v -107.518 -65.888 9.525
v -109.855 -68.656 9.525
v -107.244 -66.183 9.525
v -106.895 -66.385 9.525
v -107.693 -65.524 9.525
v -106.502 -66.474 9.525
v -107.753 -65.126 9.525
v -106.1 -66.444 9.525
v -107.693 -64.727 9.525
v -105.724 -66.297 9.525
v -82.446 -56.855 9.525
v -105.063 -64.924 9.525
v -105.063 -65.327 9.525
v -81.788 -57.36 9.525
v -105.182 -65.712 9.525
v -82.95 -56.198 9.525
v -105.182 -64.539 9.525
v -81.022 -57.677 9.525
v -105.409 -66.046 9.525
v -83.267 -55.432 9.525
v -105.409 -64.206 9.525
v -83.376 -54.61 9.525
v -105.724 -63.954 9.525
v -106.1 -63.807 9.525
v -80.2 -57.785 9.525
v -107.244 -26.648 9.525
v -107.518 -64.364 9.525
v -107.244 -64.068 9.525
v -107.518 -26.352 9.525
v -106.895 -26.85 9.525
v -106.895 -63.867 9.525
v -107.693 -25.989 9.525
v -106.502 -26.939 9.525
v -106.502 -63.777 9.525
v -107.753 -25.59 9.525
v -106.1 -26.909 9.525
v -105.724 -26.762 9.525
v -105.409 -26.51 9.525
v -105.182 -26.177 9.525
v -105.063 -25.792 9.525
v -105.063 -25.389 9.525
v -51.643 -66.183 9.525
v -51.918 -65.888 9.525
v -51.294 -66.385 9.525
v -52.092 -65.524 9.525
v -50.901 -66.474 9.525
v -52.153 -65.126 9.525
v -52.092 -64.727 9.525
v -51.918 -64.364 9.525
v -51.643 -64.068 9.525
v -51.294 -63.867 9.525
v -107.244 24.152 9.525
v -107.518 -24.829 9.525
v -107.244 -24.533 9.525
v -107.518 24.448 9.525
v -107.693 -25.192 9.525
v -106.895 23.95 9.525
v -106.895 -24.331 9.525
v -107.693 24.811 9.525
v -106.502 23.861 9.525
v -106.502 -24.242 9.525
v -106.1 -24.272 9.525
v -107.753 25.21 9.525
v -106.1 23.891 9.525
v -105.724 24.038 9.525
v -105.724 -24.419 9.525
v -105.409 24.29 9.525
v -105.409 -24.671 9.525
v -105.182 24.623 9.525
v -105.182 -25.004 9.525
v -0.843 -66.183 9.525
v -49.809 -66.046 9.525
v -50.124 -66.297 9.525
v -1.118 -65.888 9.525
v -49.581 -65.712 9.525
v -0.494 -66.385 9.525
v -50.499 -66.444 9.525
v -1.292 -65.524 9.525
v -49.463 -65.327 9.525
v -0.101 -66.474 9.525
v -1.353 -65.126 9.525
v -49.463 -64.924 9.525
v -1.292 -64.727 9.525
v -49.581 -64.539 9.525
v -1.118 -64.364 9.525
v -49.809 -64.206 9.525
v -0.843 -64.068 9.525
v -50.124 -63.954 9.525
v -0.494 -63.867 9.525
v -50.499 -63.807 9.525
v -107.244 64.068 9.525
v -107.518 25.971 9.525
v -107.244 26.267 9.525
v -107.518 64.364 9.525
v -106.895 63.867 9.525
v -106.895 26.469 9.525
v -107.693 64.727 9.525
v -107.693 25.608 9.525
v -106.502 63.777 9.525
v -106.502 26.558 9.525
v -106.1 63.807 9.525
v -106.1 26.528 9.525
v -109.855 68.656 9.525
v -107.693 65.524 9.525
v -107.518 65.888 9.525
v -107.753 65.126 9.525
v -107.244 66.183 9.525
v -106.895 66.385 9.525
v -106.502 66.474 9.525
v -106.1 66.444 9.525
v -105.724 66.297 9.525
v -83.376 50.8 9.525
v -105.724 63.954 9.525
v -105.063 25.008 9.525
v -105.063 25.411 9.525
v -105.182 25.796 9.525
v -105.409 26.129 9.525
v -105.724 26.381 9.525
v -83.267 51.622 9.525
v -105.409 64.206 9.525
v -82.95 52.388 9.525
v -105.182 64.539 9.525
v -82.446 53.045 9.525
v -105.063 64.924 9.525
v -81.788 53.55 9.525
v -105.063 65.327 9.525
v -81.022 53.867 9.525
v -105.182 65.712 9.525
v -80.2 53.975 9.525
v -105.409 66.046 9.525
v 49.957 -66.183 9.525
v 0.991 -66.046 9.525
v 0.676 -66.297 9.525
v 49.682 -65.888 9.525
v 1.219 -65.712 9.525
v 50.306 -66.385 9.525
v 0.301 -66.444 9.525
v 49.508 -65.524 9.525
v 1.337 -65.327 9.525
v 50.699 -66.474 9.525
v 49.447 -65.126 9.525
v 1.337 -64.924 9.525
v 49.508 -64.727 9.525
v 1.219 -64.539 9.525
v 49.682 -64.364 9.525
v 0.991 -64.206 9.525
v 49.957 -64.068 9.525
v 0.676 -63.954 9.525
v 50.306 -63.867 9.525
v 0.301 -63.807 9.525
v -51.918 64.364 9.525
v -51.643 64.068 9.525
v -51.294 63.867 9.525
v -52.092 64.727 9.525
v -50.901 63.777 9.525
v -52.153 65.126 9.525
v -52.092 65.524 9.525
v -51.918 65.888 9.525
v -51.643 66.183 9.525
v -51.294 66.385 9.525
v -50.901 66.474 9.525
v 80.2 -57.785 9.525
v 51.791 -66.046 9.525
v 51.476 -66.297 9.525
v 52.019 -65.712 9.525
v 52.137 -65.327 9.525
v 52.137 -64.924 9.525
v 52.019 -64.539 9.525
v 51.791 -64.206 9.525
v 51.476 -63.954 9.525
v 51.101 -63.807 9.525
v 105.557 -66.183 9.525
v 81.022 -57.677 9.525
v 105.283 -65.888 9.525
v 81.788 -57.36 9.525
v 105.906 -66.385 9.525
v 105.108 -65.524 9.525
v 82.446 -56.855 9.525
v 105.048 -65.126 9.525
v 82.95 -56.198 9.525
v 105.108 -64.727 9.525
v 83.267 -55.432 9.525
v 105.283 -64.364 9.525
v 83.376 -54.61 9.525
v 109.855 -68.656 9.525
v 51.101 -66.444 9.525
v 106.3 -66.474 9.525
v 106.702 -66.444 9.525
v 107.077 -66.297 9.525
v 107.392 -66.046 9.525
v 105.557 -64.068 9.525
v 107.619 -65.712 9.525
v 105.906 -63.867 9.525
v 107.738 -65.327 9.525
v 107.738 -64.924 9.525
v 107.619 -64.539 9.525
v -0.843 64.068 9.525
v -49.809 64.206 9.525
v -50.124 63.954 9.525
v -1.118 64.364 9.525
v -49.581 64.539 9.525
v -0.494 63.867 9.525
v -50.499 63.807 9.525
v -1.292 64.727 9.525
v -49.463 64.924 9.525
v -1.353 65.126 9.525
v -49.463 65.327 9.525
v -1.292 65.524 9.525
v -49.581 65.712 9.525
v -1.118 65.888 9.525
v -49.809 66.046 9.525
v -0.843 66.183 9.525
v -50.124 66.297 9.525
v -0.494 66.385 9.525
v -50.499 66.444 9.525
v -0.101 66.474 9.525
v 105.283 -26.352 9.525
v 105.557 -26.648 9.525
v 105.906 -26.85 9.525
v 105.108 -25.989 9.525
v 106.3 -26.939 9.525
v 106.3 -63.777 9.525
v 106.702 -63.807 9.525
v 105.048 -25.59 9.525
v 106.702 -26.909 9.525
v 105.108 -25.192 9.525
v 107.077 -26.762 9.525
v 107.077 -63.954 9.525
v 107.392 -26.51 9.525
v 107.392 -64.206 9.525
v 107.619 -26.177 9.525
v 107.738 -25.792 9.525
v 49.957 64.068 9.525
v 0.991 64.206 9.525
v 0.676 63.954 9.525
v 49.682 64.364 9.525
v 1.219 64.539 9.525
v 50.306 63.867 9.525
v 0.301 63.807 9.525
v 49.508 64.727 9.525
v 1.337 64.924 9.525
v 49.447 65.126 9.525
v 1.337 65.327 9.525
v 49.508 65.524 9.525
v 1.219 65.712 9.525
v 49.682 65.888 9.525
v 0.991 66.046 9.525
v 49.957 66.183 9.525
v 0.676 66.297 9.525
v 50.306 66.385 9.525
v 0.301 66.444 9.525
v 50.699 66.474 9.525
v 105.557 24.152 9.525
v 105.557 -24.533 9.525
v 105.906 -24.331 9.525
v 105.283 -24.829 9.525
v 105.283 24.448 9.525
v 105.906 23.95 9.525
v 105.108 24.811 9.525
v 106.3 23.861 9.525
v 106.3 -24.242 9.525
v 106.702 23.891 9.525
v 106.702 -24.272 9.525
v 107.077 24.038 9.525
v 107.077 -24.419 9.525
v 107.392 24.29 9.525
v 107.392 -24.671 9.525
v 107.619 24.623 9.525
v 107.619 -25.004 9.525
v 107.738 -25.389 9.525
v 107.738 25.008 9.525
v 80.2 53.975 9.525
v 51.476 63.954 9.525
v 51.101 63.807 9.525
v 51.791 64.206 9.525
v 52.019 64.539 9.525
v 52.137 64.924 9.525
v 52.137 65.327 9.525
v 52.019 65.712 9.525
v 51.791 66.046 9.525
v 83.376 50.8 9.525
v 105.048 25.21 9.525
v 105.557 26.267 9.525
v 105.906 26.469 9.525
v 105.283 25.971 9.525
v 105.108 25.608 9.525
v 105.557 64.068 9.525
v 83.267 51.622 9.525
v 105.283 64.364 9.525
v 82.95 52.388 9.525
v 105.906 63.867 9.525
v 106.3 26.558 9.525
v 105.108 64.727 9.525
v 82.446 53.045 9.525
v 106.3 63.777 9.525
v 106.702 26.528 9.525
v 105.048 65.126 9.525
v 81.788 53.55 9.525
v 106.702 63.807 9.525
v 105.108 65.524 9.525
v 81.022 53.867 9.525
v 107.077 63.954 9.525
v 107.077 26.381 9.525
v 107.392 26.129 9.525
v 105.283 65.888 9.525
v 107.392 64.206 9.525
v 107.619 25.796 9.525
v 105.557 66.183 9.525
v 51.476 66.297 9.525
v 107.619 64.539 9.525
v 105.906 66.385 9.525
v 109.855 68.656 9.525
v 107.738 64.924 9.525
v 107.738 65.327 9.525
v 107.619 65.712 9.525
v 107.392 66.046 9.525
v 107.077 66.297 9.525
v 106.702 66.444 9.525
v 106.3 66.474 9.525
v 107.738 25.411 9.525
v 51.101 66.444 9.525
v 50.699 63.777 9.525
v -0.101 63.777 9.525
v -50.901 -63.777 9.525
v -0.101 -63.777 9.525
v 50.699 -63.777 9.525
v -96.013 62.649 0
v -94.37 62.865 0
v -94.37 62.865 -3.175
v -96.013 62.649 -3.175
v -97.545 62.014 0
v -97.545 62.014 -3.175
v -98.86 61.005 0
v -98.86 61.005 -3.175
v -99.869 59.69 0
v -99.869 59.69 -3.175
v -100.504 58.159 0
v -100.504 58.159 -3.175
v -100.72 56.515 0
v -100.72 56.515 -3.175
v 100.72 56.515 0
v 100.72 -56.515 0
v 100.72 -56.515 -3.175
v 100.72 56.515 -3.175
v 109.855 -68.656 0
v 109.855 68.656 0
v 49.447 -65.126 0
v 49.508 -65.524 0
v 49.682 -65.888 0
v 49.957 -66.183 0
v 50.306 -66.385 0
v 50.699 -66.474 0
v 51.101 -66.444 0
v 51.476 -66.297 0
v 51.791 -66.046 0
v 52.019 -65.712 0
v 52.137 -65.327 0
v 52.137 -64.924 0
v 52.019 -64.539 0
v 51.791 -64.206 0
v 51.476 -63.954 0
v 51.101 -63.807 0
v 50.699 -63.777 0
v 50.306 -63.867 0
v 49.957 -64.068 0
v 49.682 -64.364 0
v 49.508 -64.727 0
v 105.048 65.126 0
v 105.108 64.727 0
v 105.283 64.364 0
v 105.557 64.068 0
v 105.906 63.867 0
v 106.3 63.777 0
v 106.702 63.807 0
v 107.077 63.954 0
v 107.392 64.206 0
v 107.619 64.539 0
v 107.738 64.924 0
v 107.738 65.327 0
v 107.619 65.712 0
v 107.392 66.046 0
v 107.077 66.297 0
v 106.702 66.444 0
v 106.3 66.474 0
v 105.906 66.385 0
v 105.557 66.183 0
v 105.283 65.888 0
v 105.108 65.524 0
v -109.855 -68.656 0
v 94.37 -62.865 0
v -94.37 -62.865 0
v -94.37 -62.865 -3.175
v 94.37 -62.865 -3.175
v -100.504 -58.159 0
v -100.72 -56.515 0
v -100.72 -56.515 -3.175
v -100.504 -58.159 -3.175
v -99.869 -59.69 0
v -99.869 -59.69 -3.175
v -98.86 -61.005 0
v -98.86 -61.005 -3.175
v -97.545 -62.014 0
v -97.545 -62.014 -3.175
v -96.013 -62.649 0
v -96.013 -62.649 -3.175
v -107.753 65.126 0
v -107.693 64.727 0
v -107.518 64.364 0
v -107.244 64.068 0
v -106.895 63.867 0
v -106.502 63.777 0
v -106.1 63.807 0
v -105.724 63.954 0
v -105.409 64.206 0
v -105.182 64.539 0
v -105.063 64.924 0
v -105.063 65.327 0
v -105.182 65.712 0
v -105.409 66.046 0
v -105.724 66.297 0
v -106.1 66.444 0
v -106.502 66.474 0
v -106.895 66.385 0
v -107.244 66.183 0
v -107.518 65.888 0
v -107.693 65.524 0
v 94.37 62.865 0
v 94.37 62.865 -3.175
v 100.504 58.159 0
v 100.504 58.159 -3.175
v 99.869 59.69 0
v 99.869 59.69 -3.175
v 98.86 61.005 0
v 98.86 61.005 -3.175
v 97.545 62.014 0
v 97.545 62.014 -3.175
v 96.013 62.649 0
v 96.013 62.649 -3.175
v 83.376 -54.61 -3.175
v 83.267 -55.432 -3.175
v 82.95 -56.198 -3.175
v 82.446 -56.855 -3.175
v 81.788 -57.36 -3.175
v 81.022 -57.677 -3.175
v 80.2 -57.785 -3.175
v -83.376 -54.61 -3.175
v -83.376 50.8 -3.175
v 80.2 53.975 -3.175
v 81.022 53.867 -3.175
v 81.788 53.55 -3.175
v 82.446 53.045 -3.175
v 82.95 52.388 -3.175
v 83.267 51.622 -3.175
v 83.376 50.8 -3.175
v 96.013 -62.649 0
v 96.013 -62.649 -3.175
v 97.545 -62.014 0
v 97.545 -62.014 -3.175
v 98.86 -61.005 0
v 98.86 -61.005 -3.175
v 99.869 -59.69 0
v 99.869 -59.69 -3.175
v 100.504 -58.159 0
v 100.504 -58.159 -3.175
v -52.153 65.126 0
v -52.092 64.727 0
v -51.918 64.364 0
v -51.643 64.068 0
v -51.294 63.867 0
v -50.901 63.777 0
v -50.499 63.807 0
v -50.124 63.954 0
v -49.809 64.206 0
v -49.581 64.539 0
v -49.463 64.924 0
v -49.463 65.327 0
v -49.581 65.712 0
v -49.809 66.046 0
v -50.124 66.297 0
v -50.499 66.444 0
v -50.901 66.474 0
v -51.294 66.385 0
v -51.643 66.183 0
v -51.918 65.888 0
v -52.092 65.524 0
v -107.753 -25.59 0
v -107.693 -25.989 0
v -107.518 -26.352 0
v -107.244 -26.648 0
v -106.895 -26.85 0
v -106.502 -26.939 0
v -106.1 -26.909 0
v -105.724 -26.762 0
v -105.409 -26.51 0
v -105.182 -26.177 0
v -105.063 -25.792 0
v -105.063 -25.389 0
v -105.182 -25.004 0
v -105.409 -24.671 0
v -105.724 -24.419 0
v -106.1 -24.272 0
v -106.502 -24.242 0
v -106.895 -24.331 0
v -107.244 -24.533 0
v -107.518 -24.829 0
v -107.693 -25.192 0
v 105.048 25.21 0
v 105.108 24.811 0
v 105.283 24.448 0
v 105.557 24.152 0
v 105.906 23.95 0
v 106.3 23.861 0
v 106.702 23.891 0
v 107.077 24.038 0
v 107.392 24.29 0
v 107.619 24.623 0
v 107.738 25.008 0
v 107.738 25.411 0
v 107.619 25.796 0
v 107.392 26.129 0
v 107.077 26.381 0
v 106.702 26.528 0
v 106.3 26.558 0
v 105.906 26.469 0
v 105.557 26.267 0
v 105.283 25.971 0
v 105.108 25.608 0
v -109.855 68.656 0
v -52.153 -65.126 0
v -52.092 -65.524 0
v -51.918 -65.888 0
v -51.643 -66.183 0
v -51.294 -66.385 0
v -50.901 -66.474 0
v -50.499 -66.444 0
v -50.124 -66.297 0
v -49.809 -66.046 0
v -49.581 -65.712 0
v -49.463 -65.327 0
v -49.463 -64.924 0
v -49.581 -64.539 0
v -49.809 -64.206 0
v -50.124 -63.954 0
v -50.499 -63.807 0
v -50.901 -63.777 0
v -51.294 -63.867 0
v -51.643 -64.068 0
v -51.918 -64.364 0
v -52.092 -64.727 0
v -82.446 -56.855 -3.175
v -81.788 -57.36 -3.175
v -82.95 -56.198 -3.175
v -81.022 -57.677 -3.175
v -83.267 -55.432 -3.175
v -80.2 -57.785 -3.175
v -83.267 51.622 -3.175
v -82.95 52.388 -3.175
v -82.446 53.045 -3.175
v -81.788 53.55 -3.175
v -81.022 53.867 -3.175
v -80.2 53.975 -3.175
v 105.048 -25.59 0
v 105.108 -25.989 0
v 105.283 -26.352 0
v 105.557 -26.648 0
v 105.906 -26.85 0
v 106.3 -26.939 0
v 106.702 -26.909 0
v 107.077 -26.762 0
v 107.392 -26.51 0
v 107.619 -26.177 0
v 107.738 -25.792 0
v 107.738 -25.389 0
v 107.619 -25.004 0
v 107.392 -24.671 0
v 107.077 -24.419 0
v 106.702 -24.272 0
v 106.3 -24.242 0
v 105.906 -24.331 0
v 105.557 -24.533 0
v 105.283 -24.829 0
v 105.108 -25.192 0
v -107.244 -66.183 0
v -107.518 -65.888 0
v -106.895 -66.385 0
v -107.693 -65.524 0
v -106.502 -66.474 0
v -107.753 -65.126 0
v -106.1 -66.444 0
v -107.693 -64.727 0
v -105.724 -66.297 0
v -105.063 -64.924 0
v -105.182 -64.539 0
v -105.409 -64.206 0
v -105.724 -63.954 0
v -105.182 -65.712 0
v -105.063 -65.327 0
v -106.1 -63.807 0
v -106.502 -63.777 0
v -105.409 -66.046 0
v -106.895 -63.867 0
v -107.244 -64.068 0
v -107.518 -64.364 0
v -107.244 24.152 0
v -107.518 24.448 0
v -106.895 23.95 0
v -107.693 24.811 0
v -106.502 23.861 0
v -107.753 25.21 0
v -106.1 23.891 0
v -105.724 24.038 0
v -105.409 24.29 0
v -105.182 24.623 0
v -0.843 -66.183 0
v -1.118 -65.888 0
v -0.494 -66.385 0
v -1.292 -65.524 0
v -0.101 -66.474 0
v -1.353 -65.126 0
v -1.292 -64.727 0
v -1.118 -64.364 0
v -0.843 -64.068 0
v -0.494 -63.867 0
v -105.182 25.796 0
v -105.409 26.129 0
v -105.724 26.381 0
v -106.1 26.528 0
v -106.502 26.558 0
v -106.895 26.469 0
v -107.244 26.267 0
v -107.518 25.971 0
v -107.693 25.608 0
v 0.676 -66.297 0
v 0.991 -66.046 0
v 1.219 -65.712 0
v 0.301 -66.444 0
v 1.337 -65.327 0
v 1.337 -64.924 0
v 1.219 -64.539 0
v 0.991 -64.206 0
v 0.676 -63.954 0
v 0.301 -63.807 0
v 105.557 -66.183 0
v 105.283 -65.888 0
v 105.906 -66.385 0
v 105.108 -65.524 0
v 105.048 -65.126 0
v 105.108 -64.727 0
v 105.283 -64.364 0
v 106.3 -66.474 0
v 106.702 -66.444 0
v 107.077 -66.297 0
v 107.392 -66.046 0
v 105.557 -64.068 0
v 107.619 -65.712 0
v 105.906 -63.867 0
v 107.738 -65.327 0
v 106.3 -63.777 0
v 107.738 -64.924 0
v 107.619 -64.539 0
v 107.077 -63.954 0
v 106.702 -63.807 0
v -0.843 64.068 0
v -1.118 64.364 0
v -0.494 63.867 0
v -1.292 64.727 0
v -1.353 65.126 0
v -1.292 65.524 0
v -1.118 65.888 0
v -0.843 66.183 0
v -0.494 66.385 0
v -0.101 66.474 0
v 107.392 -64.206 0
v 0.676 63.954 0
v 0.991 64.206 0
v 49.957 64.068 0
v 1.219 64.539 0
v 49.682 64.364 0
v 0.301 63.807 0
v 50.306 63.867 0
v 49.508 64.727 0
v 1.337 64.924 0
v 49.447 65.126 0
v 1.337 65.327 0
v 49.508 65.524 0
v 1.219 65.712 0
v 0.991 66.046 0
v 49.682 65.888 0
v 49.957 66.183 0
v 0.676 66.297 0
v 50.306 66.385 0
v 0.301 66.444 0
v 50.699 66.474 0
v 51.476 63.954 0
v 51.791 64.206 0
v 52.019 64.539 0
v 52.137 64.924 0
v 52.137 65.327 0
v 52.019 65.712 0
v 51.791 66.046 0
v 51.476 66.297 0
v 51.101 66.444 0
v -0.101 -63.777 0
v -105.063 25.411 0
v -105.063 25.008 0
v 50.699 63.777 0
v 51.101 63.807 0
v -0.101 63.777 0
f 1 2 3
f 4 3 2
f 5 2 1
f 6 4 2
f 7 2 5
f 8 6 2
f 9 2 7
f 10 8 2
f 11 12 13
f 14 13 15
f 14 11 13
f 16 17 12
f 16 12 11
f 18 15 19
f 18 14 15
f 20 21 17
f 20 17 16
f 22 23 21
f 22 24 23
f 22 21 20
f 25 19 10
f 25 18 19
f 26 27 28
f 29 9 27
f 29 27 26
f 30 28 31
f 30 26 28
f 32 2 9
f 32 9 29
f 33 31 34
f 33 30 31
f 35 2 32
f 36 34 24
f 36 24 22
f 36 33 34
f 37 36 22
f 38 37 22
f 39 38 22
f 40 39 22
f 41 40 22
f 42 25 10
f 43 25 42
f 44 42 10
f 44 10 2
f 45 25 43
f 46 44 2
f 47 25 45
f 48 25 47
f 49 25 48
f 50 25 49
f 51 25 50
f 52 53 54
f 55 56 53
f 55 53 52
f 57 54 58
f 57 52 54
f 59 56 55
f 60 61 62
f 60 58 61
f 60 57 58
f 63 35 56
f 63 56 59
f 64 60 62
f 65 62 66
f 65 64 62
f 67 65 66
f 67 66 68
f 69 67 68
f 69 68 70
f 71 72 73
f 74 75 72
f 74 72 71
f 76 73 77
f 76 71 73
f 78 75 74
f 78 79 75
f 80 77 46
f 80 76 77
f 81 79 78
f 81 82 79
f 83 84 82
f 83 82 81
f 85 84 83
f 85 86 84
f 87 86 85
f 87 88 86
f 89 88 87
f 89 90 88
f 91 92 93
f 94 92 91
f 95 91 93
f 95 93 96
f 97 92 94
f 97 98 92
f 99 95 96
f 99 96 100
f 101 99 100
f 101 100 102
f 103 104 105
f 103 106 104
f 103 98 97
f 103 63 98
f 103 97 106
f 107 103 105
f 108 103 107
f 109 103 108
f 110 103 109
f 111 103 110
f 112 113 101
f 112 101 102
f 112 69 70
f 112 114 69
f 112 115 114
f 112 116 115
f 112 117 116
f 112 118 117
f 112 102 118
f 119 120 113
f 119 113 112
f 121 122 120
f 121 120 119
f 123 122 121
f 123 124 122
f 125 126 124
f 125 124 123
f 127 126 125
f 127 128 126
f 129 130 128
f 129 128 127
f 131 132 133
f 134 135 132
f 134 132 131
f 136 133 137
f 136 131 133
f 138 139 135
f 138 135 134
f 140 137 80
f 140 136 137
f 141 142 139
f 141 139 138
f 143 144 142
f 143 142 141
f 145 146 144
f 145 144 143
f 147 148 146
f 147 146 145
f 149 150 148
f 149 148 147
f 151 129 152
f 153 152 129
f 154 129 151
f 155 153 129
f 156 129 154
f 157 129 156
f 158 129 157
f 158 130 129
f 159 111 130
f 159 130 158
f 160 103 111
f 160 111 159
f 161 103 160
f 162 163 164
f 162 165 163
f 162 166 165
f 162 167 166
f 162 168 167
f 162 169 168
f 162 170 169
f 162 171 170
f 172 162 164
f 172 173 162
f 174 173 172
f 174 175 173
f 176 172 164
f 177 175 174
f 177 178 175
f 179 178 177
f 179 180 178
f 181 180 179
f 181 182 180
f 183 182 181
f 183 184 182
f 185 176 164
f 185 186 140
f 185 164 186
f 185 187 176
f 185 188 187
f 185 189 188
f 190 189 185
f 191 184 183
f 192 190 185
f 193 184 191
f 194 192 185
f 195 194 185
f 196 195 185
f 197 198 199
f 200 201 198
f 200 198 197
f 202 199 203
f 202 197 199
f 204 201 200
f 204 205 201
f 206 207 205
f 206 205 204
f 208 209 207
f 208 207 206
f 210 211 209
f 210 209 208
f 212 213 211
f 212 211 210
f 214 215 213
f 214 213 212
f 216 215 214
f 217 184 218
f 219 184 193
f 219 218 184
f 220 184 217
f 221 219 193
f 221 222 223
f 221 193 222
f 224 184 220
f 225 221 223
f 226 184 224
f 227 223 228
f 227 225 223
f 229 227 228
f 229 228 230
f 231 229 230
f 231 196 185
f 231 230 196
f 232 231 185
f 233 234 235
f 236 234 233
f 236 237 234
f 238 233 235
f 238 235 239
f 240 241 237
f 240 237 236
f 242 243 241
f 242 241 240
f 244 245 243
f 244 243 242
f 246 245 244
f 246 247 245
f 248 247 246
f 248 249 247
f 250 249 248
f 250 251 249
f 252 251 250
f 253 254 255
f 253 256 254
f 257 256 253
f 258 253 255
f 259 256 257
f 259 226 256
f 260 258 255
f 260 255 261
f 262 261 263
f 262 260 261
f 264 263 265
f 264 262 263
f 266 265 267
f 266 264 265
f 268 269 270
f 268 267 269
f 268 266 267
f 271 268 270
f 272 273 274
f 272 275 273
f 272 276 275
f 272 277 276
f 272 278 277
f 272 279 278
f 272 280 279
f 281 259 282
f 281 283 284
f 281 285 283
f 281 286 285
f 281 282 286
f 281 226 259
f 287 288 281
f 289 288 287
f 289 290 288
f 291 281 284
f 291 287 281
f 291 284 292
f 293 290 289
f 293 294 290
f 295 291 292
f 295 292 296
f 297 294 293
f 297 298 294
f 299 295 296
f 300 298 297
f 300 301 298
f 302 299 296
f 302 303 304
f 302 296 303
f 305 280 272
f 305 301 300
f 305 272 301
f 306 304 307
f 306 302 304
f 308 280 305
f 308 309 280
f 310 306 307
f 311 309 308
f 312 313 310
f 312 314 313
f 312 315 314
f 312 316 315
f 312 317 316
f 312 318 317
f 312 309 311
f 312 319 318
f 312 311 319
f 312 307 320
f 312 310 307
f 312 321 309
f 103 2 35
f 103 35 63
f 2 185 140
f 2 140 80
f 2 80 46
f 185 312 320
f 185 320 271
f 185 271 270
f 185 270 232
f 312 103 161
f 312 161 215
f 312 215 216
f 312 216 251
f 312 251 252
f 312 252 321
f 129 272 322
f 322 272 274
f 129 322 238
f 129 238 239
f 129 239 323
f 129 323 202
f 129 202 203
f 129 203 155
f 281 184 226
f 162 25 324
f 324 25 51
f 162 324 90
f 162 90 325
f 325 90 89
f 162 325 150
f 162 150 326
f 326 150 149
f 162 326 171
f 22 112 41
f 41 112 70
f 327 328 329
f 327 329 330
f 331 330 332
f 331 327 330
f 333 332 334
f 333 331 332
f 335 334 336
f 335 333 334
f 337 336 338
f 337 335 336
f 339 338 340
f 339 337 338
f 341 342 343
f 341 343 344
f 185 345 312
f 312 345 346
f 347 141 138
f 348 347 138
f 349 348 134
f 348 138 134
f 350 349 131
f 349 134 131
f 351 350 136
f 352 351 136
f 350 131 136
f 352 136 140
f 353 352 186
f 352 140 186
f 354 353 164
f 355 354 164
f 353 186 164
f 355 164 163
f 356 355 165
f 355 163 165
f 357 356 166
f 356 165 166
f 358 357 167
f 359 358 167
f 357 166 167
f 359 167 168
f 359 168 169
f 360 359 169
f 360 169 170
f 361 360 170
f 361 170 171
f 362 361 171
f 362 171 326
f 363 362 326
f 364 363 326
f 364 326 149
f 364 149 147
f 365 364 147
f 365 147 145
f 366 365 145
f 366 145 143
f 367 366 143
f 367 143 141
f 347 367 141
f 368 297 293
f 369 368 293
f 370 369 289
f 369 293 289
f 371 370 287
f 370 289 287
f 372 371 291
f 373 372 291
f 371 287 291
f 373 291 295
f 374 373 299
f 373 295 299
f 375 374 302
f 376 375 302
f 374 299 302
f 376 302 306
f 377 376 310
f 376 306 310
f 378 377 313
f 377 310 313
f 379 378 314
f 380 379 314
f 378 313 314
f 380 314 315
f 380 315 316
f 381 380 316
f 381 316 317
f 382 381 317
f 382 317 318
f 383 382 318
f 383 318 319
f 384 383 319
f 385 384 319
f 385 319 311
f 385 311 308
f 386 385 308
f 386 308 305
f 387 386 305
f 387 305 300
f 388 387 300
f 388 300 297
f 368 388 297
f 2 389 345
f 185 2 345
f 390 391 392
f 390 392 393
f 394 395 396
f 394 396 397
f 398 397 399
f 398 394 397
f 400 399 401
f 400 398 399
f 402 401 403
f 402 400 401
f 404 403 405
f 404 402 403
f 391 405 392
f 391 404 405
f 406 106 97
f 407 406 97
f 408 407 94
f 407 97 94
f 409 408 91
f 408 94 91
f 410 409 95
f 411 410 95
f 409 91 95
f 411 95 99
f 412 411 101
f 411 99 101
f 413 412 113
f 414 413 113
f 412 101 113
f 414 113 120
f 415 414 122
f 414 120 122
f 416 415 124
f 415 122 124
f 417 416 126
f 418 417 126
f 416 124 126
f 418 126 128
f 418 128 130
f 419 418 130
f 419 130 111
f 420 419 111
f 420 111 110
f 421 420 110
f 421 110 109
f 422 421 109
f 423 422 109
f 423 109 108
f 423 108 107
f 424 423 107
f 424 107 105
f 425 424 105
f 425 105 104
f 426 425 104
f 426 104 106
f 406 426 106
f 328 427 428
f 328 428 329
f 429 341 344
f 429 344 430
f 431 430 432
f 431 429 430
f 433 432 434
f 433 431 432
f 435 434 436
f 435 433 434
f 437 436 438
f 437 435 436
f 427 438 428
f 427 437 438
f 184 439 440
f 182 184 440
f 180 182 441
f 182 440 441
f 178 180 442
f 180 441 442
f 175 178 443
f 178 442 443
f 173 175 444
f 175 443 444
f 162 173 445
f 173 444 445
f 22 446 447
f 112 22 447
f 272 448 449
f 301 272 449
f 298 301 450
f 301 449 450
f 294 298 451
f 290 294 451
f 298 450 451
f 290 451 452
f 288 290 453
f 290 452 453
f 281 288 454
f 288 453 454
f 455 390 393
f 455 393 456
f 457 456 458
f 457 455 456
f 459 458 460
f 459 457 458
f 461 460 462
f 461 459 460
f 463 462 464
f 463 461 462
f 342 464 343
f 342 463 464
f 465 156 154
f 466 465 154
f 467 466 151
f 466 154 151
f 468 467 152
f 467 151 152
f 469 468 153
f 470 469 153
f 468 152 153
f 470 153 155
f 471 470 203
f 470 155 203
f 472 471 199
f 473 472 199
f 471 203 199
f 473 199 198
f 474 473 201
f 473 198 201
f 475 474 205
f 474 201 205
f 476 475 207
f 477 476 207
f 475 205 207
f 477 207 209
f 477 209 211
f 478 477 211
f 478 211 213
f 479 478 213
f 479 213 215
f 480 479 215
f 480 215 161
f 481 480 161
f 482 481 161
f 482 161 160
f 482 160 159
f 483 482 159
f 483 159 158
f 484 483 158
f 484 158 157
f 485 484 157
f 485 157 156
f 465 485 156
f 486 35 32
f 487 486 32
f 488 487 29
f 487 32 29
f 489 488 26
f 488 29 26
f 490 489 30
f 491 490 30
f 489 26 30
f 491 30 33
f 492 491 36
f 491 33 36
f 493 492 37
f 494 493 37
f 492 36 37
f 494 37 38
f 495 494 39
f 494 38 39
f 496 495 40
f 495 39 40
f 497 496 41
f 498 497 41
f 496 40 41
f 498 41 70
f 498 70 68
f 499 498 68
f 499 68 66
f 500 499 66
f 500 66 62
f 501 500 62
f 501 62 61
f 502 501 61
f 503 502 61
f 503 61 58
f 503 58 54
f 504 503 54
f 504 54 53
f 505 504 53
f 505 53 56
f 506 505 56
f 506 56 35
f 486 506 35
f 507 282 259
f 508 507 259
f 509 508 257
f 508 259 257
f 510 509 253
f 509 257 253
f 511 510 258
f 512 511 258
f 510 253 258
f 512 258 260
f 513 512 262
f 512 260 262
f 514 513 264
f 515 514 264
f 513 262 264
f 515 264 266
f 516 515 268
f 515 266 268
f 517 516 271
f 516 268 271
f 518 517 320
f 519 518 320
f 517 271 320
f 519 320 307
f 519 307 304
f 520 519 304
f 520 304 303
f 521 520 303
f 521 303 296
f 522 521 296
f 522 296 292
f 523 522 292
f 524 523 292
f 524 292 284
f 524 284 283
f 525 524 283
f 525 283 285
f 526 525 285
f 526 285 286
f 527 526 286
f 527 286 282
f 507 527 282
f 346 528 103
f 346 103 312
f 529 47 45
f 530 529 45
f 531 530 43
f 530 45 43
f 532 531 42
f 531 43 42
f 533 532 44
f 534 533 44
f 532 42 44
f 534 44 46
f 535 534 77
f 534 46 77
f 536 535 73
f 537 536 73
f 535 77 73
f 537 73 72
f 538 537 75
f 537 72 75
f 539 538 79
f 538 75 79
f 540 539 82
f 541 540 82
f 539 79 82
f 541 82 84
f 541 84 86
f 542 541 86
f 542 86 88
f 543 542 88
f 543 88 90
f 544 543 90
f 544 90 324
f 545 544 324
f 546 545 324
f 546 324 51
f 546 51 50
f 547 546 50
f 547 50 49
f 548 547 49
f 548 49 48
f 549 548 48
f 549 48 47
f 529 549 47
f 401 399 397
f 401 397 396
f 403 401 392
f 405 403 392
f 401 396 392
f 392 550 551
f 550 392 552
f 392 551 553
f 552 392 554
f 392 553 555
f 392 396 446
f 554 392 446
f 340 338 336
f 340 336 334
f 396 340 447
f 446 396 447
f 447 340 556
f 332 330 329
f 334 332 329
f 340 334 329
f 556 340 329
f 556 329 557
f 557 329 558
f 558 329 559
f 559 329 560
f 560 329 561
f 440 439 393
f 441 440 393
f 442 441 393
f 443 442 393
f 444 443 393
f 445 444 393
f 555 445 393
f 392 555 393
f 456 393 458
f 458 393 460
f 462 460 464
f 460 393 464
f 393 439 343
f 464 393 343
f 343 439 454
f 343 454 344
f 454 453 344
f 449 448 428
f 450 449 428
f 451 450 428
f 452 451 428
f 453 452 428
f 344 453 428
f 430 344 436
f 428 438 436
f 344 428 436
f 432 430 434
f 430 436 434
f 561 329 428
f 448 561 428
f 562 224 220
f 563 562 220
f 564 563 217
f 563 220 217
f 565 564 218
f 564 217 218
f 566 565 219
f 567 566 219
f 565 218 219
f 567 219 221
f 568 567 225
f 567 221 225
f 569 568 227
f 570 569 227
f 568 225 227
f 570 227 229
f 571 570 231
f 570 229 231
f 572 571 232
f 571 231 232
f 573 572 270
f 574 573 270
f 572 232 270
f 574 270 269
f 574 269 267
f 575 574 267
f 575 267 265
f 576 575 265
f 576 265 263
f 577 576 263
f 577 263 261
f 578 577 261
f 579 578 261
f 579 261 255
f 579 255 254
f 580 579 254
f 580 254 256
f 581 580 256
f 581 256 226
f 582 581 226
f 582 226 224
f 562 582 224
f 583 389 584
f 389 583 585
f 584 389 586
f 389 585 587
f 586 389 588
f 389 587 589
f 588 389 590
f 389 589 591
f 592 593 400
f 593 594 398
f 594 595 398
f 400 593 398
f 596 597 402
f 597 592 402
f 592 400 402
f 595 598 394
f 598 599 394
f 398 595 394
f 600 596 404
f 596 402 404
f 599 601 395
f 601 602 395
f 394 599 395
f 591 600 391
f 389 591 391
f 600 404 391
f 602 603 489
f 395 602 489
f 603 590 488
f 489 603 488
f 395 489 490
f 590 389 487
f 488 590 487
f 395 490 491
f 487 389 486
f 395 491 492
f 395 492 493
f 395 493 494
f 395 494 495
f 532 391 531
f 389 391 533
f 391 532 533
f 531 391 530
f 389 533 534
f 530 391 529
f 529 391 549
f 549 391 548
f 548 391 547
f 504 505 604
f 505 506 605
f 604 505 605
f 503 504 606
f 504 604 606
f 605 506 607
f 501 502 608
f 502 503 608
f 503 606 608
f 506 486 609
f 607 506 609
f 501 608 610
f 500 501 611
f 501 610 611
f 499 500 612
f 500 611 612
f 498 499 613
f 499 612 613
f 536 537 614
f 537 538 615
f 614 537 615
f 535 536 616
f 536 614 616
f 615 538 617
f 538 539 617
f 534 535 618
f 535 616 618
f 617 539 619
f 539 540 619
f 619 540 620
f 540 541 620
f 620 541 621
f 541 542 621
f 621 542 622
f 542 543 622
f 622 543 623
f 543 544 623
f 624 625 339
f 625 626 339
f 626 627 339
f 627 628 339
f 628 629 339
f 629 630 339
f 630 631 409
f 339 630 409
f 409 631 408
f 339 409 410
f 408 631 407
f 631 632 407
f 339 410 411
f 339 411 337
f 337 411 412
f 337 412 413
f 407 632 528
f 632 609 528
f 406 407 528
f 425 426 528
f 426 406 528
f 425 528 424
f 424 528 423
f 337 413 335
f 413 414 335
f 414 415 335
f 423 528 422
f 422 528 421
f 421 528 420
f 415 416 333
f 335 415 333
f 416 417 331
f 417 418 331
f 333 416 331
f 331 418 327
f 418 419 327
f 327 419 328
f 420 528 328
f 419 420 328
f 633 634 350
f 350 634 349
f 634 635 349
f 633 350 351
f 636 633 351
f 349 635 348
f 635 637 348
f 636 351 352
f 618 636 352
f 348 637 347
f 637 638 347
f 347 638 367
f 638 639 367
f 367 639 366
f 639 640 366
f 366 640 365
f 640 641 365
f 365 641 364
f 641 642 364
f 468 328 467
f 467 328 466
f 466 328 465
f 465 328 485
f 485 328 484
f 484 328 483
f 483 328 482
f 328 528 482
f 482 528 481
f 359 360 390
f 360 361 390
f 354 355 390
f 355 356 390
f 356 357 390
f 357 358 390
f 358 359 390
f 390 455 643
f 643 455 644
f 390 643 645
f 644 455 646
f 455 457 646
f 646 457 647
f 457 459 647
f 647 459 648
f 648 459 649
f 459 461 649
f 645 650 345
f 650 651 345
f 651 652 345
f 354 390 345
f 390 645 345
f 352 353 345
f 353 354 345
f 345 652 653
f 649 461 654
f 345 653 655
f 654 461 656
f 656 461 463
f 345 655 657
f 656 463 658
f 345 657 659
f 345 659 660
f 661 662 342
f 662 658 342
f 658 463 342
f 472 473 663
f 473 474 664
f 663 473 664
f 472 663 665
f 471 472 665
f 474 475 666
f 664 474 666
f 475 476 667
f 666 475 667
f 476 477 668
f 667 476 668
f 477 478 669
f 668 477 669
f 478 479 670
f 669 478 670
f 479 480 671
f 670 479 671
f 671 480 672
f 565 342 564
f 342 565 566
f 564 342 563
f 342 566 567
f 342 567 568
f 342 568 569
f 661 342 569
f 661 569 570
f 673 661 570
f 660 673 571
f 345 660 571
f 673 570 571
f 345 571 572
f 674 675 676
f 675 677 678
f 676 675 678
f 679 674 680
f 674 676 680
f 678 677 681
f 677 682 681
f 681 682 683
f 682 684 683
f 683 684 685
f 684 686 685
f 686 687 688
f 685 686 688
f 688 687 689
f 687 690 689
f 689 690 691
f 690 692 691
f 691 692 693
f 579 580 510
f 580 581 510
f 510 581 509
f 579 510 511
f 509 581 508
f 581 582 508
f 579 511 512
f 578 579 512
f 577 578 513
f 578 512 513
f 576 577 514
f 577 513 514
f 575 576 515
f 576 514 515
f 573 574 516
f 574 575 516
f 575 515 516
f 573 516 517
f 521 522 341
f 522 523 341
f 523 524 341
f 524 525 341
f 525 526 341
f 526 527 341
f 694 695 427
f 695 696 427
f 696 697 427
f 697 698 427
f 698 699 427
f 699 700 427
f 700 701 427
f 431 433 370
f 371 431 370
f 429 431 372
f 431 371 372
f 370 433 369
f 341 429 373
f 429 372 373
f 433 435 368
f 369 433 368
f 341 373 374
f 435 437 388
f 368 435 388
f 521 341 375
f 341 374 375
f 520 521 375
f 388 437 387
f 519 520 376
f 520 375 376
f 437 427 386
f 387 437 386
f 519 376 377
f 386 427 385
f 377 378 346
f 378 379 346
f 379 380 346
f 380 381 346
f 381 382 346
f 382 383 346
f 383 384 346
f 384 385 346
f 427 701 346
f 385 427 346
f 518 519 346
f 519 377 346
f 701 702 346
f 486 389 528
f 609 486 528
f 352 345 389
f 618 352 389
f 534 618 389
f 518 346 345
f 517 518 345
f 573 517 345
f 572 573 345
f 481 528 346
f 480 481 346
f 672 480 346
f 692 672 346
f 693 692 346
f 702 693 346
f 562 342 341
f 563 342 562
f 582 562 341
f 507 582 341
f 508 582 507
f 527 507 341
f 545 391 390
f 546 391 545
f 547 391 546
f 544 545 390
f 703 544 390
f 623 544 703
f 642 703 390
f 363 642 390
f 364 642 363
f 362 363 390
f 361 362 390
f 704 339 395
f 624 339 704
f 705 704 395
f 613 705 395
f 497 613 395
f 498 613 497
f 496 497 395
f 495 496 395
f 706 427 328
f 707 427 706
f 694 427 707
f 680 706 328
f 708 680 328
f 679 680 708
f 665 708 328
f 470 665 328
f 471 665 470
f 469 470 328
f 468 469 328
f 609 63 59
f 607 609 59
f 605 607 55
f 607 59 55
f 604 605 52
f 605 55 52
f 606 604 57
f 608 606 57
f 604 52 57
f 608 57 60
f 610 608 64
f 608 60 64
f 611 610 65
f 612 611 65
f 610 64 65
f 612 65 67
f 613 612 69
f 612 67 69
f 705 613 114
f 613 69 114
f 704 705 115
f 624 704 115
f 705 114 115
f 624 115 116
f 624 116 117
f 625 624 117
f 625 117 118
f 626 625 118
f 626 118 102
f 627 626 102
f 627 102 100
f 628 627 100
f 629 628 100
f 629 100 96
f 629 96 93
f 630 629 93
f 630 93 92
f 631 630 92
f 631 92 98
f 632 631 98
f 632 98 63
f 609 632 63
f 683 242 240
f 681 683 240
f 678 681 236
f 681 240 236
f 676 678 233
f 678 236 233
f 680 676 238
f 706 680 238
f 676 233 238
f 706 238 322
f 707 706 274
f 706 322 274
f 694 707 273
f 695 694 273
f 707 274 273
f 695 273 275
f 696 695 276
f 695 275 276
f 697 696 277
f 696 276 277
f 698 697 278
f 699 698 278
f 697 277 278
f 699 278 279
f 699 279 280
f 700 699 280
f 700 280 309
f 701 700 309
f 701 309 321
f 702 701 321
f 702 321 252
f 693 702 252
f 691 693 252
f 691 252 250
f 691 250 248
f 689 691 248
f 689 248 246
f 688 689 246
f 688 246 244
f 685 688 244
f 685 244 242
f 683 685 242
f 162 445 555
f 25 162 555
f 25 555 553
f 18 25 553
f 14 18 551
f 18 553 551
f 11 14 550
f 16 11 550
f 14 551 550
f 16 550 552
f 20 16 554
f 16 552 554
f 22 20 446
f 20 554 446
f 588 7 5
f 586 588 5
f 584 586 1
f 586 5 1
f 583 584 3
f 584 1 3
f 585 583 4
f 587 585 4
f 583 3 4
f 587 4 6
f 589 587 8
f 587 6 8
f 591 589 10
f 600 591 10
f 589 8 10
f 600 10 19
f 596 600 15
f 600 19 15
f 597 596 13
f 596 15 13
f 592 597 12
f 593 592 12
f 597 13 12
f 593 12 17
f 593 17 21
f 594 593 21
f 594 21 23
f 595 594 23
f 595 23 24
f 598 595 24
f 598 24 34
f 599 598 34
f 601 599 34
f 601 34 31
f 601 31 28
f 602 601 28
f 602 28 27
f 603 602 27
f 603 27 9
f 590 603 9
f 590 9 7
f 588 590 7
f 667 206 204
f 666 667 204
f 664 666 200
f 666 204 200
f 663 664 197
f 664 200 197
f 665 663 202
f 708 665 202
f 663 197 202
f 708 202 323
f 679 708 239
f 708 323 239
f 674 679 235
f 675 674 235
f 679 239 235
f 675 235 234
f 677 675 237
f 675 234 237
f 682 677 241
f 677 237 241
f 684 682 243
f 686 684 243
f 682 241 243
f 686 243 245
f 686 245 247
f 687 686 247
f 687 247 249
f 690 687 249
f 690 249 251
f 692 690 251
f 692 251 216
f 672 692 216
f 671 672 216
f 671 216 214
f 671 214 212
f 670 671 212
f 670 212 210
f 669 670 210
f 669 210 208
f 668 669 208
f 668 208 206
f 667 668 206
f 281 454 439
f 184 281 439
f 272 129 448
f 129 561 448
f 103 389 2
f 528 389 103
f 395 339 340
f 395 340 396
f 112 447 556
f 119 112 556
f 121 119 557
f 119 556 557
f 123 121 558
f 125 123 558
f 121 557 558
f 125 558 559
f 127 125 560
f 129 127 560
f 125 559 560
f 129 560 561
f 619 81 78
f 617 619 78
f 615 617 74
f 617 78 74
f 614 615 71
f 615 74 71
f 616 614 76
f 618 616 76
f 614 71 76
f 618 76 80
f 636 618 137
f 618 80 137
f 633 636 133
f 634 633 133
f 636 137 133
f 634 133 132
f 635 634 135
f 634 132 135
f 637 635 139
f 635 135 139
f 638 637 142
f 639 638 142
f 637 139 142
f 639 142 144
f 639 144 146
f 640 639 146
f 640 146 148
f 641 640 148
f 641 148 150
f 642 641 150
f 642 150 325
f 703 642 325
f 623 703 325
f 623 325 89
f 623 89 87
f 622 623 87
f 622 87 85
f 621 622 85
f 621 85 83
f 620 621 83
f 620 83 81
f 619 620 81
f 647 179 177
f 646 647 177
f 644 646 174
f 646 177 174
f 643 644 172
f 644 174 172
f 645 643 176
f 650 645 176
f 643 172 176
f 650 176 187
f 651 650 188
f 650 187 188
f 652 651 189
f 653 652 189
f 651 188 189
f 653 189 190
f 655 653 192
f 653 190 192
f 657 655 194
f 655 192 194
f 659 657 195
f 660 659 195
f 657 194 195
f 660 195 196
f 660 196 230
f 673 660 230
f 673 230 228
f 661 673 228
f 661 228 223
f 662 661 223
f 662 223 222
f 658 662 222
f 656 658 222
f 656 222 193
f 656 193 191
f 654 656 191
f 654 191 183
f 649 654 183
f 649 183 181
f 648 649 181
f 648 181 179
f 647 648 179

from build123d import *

# Parameters (mm, degrees)
F1_DEPTH = 3.175
F2_W     = 219.71
F2_H     = 137.3124
F3_DEPTH = 9.525
F5_D     = 2.7051


# Not quite as in the source:
# - a feature of the source that left no trace in its solid (it failed there, or was rolled back) is left out


with BuildPart() as f1:
    # F0 (on Top) → F1 (new body)
    with BuildSketch(Plane.XY):
        with BuildLine():
            ThreePointArc((100.71989, 56.515), (98.8600180605, 61.0051280605), (94.36989, 62.865))
            Line((94.36989, 62.865), (-94.36989, 62.865))
            ThreePointArc((-94.36989, 62.865), (-98.8600180605, 61.0051280605), (-100.71989, 56.515))
            Line((-100.71989, 56.515), (-100.71989, -56.515))
            ThreePointArc((-100.71989, -56.515), (-98.8600180605, -61.0051280605), (-94.36989, -62.865))
            Line((-94.36989, -62.865), (94.36989, -62.865))
            ThreePointArc((94.36989, -62.865), (98.8600180605, -61.0051280605), (100.71989, -56.515))
            Line((100.71989, -56.515), (100.71989, 56.515))
        make_face()
        with BuildLine():
            ThreePointArc((83.3755, -54.61), (82.4455640303, -56.8550640303), (80.2005, -57.785))
            Line((80.2005, -57.785), (-80.2005, -57.785))
            ThreePointArc((-80.2005, -57.785), (-82.4455640303, -56.8550640303), (-83.3755, -54.61))
            Line((-83.3755, -54.61), (-83.3755, 50.8))
            ThreePointArc((-83.3755, 50.8), (-82.4455640303, 53.0450640303), (-80.2005, 53.975))
            Line((-80.2005, 53.975), (80.2005, 53.975))
            ThreePointArc((80.2005, 53.975), (82.4455640303, 53.0450640303), (83.3755, 50.8))
            Line((83.3755, 50.8), (83.3755, -54.61))
        make_face(mode=Mode.SUBTRACT)
    extrude(amount=-F1_DEPTH)

    # F2 (on face) → F3 (join)
    with BuildSketch(Plane.XY):
        Rectangle(F2_W, F2_H)
        with BuildLine():
            Line((-80.2005, 53.975), (80.2005, 53.975))
            ThreePointArc((80.2005, 53.975), (82.4455640303, 53.0450640303), (83.3755, 50.8))
            Line((83.3755, 50.8), (83.3755, -54.61))
            ThreePointArc((83.3755, -54.61), (82.4455640303, -56.8550640303), (80.2005, -57.785))
            Line((80.2005, -57.785), (-80.2005, -57.785))
            ThreePointArc((-80.2005, -57.785), (-82.4455640303, -56.8550640303), (-83.3755, -54.61))
            Line((-83.3755, -54.61), (-83.3755, 50.8))
            ThreePointArc((-83.3755, 50.8), (-82.4455640303, 53.0450640303), (-80.2005, 53.975))
        make_face(mode=Mode.SUBTRACT)
    extrude(amount=F3_DEPTH)

    # F5 (through all)
    with Locations(Plane(origin=(0, 0, 0), x_dir=(1, 0, 0), z_dir=(0, 0, -1))):
        with Locations((106.4006, -65.1256), (50.8, -65.1256), (0, -65.1256), (-50.8, -65.1256), (-106.4006, -65.1256), (-106.4006, -25.2095), (-106.4006, 25.5905), (-106.4006, 65.1256), (0, 65.1256), (-50.8, 65.1256), (50.8, 65.1256), (106.4006, 65.1256), (106.4006, 25.5905), (106.4006, -25.2095)):
            Hole(F5_D / 2)


solid = f1.part
